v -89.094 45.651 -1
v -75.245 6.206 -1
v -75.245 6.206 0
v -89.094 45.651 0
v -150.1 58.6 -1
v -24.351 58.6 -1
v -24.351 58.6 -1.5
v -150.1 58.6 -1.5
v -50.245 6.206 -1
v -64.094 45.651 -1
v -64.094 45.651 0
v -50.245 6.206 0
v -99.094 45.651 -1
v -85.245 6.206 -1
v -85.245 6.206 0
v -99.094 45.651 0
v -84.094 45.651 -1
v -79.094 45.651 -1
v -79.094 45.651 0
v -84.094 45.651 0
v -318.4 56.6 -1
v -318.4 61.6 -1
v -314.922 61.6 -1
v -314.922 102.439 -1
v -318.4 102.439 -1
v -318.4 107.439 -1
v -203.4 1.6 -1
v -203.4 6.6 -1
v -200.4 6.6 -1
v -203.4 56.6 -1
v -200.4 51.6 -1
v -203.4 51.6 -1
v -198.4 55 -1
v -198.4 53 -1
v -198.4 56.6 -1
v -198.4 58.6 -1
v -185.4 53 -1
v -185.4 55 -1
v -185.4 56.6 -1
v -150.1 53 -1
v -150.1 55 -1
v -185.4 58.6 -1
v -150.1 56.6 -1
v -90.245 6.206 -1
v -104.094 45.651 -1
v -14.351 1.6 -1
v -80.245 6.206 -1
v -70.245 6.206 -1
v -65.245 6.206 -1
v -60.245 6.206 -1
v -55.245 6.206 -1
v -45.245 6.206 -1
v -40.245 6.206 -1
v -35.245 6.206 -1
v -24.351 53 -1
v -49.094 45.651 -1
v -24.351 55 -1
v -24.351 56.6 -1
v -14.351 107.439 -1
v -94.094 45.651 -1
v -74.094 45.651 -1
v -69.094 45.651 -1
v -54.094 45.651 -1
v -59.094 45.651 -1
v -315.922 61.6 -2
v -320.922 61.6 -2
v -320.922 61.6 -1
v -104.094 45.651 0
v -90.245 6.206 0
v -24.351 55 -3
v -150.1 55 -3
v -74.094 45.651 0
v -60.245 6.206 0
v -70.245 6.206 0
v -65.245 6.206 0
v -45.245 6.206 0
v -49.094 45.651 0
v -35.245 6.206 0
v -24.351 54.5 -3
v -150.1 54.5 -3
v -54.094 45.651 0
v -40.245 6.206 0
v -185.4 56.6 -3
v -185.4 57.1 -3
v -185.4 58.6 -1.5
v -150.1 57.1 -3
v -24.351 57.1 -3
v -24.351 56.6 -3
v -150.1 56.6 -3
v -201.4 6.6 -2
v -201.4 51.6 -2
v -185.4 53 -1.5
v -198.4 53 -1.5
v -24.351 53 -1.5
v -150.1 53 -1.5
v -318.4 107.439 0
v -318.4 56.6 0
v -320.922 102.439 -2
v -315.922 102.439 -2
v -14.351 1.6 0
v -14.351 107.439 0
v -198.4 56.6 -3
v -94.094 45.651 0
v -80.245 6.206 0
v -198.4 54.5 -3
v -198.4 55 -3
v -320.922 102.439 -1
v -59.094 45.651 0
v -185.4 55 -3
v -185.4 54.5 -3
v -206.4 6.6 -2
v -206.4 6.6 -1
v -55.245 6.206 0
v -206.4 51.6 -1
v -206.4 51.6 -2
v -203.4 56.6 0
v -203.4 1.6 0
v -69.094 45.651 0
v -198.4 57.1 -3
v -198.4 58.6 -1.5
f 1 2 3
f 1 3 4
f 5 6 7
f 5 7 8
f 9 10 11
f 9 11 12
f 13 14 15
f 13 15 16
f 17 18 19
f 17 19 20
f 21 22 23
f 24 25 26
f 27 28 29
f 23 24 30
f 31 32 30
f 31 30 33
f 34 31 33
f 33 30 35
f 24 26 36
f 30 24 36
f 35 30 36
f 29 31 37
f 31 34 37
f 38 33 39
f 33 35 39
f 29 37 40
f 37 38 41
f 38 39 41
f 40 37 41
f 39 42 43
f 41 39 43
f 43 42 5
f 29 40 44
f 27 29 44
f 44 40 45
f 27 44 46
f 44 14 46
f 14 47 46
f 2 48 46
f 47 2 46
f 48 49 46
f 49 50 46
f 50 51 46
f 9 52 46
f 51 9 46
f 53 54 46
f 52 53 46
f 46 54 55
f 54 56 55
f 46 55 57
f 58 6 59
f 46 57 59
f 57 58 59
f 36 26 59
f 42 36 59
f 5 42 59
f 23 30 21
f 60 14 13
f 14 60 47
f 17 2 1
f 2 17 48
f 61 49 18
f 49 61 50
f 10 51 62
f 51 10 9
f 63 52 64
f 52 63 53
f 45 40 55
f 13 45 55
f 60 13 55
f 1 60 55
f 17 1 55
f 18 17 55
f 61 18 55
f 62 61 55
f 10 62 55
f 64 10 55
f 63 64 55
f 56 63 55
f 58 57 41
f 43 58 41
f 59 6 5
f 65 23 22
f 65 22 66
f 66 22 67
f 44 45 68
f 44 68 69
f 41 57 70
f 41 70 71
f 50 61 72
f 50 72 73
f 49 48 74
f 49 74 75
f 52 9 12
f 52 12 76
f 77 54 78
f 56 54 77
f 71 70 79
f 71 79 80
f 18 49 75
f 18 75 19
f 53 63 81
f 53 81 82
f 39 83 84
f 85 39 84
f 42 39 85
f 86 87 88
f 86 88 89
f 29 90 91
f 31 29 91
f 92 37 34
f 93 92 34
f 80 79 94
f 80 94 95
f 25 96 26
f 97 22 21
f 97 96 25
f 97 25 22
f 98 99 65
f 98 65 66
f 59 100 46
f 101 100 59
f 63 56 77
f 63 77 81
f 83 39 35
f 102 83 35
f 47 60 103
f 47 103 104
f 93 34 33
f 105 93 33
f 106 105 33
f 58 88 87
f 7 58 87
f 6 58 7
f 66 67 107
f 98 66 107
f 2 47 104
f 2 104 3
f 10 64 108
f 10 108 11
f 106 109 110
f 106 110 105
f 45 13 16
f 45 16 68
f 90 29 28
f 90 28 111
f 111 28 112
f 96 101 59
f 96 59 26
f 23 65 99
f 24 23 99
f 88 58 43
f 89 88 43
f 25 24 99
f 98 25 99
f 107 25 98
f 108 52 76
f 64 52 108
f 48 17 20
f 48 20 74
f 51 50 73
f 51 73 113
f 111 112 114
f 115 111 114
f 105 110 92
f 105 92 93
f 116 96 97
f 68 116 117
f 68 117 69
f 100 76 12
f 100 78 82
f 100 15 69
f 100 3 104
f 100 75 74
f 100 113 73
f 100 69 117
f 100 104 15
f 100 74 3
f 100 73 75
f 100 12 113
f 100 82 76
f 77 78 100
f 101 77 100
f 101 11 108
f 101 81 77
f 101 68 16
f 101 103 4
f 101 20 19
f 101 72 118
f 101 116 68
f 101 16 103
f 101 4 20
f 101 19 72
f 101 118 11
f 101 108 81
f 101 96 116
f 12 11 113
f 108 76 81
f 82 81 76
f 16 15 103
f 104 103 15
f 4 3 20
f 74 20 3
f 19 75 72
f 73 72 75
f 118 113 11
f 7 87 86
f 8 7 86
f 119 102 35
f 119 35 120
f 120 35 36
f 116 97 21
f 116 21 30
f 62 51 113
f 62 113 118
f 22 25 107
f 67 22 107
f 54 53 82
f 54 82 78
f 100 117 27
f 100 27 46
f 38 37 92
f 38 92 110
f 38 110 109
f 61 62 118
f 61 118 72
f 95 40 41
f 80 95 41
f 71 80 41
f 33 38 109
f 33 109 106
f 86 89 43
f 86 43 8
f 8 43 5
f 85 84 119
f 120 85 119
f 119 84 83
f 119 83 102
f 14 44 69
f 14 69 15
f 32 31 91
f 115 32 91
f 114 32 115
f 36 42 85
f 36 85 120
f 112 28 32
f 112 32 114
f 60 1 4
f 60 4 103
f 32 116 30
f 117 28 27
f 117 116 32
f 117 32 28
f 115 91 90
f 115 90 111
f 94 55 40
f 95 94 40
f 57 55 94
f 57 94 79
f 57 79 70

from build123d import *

# Parameters (mm, degrees)
BOSS_EXTRU_1_DEPTH      = 1
ESQUISSE2_W             = 5
ESQUISSE2_H             = 40.838750305
ESQUISSE2_H_2           = 45
BOSS_EXTRU_2_DEPTH      = 1
ESQUISSE3_W             = 125.749218941
ESQUISSE3_H             = 2
ESQUISSE3_W_2           = 13
BOSS_EXTRU_3_DEPTH      = 2
CHANFREIN1_SIZE         = 1.5
CHANFREIN2_SIZE         = 1
ENL_V_MAT_EXTRU_1_DEPTH = 339.434208864


with BuildPart() as part:
    # Esquisse1 → Boss.-Extru.1 (new body)
    with BuildSketch(Plane.XY):
        Polygon((-318.4, 56.6), (-203.4, 56.6), (-203.4, 1.6), (-14.350781059, 1.6), (-14.350781059, 107.438750305), (-318.4, 107.438750305), align=None)
    extrude(amount=-BOSS_EXTRU_1_DEPTH)

    # Esquisse2 → Boss.-Extru.2 (add)
    with BuildSketch(Plane(origin=(0, 0, -1), x_dir=(-1, 0, 0), z_dir=(0, 0, -1))):
        with Locations((318.421530381, 82.019375153)):
            Rectangle(ESQUISSE2_W, ESQUISSE2_H)
        with Locations((203.9, 29.1)):
            Rectangle(ESQUISSE2_W, ESQUISSE2_H_2)
    extrude(amount=BOSS_EXTRU_2_DEPTH)

    # Esquisse3 → Boss.-Extru.3 (add)
    with BuildSketch(Plane(origin=(0, 0, -1), x_dir=(-1, 0, 0), z_dir=(0, 0, -1))):
        with Locations((87.22539053, 57.6)):
            Rectangle(ESQUISSE3_W, ESQUISSE3_H)
        with Locations((87.22539053, 54)):
            Rectangle(ESQUISSE3_W, ESQUISSE3_H)
        with Locations((191.9, 57.6)):
            Rectangle(ESQUISSE3_W_2, ESQUISSE3_H)
        with Locations((191.9, 54)):
            Rectangle(ESQUISSE3_W_2, ESQUISSE3_H)
    extrude(amount=BOSS_EXTRU_3_DEPTH)

    # Chanfrein1
    chanfrein1_edges = [part.edges().sort_by_distance(p)[0] for p in [
        (-87.22539053, 58.6, -3),
        (-87.22539053, 53, -3),
        (-191.9, 58.6, -3),
        (-191.9, 53, -3),
    ]]
    chamfer(chanfrein1_edges, length=CHANFREIN1_SIZE)

    # Chanfrein2
    chanfrein2_edges = [part.edges().sort_by_distance(p)[0] for p in [
        (-201.4, 29.1, -1),
        (-315.921530381, 82.019375153, -1),
    ]]
    chamfer(chanfrein2_edges, length=CHANFREIN2_SIZE - 0.0001)  # a hair under: the kernel refuses the full size

    # Esquisse4 → Enlèv. mat.-Extru.1 (cut, through all)
    with BuildSketch(Plane(origin=(0, 0, -1), x_dir=(-1, 0, 0), z_dir=(0, 0, -1))):
        Polygon((90.245471521, 6.206378309), (85.245471521, 6.206378309), (99.094461568, 45.651267323), (104.094461568, 45.651267323), align=None)
        Polygon((94.094461568, 45.651267323), (80.245471521, 6.206378309), (75.245471521, 6.206378309), (89.094461568, 45.651267323), align=None)
        Polygon((84.094461568, 45.651267323), (70.245471521, 6.206378309), (65.245471521, 6.206378309), (79.094461568, 45.651267323), align=None)
        Polygon((74.094461568, 45.651267323), (60.245471521, 6.206378309), (55.245471521, 6.206378309), (69.094461568, 45.651267323), align=None)
        Polygon((64.094461568, 45.651267323), (50.245471521, 6.206378309), (45.245471521, 6.206378309), (59.094461568, 45.651267323), align=None)
        Polygon((54.094461568, 45.651267323), (40.245471521, 6.206378309), (35.245471521, 6.206378309), (49.094461568, 45.651267323), align=None)
    extrude(amount=-ENL_V_MAT_EXTRU_1_DEPTH, mode=Mode.SUBTRACT)


solid = part.part
